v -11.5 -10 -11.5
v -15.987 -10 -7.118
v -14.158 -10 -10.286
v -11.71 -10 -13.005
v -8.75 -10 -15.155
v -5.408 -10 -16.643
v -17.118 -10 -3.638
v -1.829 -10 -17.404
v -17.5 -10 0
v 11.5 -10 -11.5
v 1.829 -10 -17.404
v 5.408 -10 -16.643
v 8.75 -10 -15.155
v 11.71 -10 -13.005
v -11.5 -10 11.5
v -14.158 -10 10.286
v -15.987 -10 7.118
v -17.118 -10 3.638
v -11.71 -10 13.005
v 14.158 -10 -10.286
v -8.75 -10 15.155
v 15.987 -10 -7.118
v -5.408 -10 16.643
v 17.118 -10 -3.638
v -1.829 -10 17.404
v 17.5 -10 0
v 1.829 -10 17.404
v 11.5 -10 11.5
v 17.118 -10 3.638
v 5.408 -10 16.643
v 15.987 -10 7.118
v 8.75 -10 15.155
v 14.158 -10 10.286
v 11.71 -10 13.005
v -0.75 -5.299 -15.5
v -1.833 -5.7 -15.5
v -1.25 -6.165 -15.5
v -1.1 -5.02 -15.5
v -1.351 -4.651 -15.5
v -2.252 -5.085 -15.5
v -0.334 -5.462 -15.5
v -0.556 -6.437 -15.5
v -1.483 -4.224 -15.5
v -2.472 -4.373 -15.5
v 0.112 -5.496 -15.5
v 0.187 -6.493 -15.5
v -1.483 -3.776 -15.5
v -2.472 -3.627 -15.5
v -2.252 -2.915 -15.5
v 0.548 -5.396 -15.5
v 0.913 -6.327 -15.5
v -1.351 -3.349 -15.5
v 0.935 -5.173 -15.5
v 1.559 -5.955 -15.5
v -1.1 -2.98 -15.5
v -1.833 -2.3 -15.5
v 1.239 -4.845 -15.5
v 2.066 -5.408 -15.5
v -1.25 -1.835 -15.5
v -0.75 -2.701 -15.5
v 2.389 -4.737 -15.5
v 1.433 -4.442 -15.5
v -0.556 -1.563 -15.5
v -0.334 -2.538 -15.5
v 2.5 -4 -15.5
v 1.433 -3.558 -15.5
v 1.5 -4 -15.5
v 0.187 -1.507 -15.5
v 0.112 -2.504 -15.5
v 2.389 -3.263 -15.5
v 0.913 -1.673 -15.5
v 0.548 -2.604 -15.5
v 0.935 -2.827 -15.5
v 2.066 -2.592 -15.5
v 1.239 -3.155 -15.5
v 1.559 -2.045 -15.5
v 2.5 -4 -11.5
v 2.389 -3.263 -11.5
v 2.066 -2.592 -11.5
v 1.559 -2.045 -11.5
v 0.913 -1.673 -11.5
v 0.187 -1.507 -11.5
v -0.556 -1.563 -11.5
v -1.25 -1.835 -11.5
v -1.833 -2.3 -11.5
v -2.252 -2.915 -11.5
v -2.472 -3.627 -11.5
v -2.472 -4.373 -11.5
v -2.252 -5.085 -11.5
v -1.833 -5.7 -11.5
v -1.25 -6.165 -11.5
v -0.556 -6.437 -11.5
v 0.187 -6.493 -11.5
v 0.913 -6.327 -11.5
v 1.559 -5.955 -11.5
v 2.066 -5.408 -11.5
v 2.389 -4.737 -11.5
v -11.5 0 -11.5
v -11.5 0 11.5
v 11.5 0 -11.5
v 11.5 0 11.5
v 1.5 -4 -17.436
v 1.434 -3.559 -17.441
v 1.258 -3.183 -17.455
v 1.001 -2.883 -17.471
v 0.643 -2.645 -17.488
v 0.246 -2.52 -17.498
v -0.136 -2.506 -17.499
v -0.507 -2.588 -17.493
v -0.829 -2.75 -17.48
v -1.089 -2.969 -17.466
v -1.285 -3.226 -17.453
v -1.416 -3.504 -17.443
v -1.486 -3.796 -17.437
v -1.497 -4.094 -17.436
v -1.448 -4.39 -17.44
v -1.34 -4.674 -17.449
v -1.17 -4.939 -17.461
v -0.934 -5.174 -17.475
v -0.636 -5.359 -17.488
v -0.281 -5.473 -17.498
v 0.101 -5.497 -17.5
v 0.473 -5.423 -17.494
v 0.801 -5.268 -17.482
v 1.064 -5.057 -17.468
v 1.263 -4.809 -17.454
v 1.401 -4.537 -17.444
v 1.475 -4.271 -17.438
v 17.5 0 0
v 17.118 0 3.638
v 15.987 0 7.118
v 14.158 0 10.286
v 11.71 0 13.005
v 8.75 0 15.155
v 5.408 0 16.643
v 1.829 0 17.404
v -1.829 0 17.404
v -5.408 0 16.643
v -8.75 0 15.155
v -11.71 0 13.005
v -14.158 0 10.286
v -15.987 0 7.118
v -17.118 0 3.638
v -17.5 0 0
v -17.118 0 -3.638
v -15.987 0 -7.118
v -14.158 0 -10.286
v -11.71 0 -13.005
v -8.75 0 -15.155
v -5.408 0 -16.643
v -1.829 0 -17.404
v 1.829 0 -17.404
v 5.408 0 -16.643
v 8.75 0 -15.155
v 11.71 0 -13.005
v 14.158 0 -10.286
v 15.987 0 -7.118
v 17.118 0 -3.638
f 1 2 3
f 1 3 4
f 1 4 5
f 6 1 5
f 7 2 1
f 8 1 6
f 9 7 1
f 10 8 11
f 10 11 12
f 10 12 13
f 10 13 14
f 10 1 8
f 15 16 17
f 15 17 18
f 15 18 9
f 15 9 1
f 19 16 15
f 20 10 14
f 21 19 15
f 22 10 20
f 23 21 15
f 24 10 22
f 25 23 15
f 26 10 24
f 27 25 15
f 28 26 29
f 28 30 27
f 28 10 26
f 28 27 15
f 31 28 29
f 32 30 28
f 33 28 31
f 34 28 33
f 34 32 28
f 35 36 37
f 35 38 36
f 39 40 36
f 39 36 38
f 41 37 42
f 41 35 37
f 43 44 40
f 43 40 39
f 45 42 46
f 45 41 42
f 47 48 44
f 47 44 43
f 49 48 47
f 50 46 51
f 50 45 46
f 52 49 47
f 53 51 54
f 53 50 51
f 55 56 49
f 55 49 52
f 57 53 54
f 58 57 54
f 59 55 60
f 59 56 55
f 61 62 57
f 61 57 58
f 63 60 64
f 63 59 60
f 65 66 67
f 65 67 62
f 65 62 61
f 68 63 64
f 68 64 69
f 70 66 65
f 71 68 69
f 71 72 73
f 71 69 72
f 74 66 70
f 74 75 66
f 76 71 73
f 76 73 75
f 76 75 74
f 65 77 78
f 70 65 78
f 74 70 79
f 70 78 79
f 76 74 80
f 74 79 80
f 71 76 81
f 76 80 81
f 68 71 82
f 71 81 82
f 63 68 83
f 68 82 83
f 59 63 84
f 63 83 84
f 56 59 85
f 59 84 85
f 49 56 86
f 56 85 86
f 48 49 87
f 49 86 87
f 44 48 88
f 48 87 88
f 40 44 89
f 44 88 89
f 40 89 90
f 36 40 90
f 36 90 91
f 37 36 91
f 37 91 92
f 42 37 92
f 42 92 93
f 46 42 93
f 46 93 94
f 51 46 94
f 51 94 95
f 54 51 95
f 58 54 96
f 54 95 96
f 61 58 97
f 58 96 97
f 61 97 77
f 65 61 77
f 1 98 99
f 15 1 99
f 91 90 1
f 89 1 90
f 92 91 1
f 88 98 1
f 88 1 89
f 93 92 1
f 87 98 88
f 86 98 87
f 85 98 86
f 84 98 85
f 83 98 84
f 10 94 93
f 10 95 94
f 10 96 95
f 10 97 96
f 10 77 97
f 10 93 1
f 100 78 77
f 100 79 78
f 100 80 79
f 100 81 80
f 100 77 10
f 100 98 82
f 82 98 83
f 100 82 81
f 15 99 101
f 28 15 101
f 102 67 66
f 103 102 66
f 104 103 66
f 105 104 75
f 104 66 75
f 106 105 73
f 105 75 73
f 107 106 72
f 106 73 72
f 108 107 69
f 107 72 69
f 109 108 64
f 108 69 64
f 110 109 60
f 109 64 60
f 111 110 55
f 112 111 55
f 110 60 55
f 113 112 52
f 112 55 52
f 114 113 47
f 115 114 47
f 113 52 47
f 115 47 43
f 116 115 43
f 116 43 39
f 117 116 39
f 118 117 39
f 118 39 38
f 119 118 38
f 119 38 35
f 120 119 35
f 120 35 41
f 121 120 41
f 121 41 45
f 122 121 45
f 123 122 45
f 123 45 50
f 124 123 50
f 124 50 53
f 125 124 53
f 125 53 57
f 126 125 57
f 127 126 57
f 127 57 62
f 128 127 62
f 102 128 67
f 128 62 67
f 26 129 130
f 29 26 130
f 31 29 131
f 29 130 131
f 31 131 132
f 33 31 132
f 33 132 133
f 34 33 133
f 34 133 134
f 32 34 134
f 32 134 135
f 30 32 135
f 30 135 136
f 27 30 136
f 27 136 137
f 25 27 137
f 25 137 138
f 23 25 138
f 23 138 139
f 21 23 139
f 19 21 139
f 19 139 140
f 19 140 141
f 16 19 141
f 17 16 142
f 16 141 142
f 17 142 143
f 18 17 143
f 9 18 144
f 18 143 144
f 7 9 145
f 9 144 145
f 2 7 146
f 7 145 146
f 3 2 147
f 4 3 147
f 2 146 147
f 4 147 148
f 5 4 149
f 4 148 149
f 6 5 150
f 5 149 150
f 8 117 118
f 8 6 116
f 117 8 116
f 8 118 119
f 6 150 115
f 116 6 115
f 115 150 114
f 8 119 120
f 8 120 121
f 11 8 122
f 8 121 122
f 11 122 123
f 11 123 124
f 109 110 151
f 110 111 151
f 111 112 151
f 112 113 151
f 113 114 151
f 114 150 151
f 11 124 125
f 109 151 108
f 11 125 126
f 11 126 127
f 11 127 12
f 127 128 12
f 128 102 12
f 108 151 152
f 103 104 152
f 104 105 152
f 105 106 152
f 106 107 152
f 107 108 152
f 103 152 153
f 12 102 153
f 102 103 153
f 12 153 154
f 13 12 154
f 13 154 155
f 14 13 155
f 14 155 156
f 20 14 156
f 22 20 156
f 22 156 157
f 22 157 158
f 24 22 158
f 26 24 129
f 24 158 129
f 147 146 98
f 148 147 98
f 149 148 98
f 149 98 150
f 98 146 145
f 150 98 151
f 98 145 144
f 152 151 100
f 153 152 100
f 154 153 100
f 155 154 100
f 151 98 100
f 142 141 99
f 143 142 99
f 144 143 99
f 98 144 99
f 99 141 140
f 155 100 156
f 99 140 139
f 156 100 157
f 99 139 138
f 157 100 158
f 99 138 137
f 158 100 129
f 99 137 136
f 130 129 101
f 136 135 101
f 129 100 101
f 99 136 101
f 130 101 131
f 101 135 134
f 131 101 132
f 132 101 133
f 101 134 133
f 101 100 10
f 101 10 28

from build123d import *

# Parameters (mm, degrees)
F0_R     = 17.5
F0_W     = 23
F0_H     = 23
F1_DEPTH = 10
F2_R     = 1.5
F3_DEPTH = 25
F4_R     = 2.5
F5_DEPTH = 4


with BuildPart() as f1:
    # F0 (on Front) → F1 (new body)
    with BuildSketch(Plane.XZ):
        Circle(F0_R)
        Rectangle(F0_W, F0_H, mode=Mode.SUBTRACT)
    extrude(amount=F1_DEPTH)

    # F2 (on Top) → F3 (cut)
    with BuildSketch(Plane.XY):
        with Locations((0, -4)):
            Circle(F2_R)
    extrude(amount=-F3_DEPTH, mode=Mode.SUBTRACT)

    # F4 (on face) → F5 (cut)
    with BuildSketch(Plane.XY.offset(-11.5)):
        with Locations((0, -4)):
            Circle(F4_R)
    extrude(amount=-F5_DEPTH, mode=Mode.SUBTRACT)


solid = f1.part
